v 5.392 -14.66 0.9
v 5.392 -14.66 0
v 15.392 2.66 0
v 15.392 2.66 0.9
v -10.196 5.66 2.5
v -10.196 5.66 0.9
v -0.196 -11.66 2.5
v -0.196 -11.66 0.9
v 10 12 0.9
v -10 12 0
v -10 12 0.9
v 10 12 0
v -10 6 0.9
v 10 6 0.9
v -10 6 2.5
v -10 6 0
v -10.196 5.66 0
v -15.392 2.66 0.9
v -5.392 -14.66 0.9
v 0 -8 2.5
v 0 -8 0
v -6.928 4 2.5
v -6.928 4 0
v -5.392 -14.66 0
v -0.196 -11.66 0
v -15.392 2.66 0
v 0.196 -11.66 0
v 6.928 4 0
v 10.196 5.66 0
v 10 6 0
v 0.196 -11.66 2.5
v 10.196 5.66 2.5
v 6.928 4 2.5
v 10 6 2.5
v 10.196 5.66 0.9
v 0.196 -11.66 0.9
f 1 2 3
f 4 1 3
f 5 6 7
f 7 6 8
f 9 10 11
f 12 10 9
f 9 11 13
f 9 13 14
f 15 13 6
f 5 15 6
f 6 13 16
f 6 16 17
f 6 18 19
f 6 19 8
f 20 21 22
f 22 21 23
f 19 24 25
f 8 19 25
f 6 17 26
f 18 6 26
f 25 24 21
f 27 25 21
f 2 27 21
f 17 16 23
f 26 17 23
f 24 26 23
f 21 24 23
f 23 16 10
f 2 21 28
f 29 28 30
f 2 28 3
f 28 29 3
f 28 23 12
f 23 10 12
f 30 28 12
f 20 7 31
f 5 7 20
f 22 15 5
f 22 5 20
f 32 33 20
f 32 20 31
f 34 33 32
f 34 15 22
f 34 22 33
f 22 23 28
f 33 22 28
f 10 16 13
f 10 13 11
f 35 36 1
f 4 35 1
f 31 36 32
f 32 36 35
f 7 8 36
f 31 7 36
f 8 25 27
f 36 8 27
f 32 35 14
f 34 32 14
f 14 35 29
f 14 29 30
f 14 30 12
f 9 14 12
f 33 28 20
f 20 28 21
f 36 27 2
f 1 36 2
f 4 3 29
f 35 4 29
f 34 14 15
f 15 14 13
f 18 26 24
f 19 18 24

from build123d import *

# Parameters (mm, degrees)
F1_DEPTH = 0.9
F0_W     = 20
F0_H     = 6
F2_DEPTH = 2.5


with BuildPart() as f1:
    # F0 (on Top) → F1 (new body)
    with BuildSketch(Plane.XY):
        Polygon((-0.1961524227, -11.6602540378), (-10.1961524227, 5.6602540378), (-15.3923048454, 2.6602540378), (-5.3923048454, -14.6602540378), align=None)
    extrude(amount=F1_DEPTH)



with BuildPart() as f1b:
    # F0 (on Top) → F1, piece 2 (new body)
    with BuildSketch(Plane.XY):
        with Locations((0, 9)):
            Rectangle(F0_W, F0_H)
    extrude(amount=F1_DEPTH)


with BuildPart() as f1c:
    # F0 (on Top) → F1, piece 3 (new body)
    with BuildSketch(Plane.XY):
        Polygon((15.3923048454, 2.6602540378), (10.1961524227, 5.6602540378), (0.1961524227, -11.6602540378), (5.3923048454, -14.6602540378), align=None)
    extrude(amount=F1_DEPTH)


with BuildPart() as f1_1:
    add(f1.part)

    add(f1b.part)  # F2 merges F1b

    add(f1c.part)  # F2 merges F1c
    # F0 (on Top) → F2 (join)
    with BuildSketch(Plane.XY):
        Polygon((10, 6), (-10, 6), (-10.1961524227, 5.6602540378), (-0.1961524227, -11.6602540378), (0.1961524227, -11.6602540378), (10.1961524227, 5.6602540378), align=None)
        Polygon((6.9282032303, 4), (0, -8), (-6.9282032303, 4), align=None, mode=Mode.SUBTRACT)
    extrude(amount=F2_DEPTH)


solid = f1_1.part
